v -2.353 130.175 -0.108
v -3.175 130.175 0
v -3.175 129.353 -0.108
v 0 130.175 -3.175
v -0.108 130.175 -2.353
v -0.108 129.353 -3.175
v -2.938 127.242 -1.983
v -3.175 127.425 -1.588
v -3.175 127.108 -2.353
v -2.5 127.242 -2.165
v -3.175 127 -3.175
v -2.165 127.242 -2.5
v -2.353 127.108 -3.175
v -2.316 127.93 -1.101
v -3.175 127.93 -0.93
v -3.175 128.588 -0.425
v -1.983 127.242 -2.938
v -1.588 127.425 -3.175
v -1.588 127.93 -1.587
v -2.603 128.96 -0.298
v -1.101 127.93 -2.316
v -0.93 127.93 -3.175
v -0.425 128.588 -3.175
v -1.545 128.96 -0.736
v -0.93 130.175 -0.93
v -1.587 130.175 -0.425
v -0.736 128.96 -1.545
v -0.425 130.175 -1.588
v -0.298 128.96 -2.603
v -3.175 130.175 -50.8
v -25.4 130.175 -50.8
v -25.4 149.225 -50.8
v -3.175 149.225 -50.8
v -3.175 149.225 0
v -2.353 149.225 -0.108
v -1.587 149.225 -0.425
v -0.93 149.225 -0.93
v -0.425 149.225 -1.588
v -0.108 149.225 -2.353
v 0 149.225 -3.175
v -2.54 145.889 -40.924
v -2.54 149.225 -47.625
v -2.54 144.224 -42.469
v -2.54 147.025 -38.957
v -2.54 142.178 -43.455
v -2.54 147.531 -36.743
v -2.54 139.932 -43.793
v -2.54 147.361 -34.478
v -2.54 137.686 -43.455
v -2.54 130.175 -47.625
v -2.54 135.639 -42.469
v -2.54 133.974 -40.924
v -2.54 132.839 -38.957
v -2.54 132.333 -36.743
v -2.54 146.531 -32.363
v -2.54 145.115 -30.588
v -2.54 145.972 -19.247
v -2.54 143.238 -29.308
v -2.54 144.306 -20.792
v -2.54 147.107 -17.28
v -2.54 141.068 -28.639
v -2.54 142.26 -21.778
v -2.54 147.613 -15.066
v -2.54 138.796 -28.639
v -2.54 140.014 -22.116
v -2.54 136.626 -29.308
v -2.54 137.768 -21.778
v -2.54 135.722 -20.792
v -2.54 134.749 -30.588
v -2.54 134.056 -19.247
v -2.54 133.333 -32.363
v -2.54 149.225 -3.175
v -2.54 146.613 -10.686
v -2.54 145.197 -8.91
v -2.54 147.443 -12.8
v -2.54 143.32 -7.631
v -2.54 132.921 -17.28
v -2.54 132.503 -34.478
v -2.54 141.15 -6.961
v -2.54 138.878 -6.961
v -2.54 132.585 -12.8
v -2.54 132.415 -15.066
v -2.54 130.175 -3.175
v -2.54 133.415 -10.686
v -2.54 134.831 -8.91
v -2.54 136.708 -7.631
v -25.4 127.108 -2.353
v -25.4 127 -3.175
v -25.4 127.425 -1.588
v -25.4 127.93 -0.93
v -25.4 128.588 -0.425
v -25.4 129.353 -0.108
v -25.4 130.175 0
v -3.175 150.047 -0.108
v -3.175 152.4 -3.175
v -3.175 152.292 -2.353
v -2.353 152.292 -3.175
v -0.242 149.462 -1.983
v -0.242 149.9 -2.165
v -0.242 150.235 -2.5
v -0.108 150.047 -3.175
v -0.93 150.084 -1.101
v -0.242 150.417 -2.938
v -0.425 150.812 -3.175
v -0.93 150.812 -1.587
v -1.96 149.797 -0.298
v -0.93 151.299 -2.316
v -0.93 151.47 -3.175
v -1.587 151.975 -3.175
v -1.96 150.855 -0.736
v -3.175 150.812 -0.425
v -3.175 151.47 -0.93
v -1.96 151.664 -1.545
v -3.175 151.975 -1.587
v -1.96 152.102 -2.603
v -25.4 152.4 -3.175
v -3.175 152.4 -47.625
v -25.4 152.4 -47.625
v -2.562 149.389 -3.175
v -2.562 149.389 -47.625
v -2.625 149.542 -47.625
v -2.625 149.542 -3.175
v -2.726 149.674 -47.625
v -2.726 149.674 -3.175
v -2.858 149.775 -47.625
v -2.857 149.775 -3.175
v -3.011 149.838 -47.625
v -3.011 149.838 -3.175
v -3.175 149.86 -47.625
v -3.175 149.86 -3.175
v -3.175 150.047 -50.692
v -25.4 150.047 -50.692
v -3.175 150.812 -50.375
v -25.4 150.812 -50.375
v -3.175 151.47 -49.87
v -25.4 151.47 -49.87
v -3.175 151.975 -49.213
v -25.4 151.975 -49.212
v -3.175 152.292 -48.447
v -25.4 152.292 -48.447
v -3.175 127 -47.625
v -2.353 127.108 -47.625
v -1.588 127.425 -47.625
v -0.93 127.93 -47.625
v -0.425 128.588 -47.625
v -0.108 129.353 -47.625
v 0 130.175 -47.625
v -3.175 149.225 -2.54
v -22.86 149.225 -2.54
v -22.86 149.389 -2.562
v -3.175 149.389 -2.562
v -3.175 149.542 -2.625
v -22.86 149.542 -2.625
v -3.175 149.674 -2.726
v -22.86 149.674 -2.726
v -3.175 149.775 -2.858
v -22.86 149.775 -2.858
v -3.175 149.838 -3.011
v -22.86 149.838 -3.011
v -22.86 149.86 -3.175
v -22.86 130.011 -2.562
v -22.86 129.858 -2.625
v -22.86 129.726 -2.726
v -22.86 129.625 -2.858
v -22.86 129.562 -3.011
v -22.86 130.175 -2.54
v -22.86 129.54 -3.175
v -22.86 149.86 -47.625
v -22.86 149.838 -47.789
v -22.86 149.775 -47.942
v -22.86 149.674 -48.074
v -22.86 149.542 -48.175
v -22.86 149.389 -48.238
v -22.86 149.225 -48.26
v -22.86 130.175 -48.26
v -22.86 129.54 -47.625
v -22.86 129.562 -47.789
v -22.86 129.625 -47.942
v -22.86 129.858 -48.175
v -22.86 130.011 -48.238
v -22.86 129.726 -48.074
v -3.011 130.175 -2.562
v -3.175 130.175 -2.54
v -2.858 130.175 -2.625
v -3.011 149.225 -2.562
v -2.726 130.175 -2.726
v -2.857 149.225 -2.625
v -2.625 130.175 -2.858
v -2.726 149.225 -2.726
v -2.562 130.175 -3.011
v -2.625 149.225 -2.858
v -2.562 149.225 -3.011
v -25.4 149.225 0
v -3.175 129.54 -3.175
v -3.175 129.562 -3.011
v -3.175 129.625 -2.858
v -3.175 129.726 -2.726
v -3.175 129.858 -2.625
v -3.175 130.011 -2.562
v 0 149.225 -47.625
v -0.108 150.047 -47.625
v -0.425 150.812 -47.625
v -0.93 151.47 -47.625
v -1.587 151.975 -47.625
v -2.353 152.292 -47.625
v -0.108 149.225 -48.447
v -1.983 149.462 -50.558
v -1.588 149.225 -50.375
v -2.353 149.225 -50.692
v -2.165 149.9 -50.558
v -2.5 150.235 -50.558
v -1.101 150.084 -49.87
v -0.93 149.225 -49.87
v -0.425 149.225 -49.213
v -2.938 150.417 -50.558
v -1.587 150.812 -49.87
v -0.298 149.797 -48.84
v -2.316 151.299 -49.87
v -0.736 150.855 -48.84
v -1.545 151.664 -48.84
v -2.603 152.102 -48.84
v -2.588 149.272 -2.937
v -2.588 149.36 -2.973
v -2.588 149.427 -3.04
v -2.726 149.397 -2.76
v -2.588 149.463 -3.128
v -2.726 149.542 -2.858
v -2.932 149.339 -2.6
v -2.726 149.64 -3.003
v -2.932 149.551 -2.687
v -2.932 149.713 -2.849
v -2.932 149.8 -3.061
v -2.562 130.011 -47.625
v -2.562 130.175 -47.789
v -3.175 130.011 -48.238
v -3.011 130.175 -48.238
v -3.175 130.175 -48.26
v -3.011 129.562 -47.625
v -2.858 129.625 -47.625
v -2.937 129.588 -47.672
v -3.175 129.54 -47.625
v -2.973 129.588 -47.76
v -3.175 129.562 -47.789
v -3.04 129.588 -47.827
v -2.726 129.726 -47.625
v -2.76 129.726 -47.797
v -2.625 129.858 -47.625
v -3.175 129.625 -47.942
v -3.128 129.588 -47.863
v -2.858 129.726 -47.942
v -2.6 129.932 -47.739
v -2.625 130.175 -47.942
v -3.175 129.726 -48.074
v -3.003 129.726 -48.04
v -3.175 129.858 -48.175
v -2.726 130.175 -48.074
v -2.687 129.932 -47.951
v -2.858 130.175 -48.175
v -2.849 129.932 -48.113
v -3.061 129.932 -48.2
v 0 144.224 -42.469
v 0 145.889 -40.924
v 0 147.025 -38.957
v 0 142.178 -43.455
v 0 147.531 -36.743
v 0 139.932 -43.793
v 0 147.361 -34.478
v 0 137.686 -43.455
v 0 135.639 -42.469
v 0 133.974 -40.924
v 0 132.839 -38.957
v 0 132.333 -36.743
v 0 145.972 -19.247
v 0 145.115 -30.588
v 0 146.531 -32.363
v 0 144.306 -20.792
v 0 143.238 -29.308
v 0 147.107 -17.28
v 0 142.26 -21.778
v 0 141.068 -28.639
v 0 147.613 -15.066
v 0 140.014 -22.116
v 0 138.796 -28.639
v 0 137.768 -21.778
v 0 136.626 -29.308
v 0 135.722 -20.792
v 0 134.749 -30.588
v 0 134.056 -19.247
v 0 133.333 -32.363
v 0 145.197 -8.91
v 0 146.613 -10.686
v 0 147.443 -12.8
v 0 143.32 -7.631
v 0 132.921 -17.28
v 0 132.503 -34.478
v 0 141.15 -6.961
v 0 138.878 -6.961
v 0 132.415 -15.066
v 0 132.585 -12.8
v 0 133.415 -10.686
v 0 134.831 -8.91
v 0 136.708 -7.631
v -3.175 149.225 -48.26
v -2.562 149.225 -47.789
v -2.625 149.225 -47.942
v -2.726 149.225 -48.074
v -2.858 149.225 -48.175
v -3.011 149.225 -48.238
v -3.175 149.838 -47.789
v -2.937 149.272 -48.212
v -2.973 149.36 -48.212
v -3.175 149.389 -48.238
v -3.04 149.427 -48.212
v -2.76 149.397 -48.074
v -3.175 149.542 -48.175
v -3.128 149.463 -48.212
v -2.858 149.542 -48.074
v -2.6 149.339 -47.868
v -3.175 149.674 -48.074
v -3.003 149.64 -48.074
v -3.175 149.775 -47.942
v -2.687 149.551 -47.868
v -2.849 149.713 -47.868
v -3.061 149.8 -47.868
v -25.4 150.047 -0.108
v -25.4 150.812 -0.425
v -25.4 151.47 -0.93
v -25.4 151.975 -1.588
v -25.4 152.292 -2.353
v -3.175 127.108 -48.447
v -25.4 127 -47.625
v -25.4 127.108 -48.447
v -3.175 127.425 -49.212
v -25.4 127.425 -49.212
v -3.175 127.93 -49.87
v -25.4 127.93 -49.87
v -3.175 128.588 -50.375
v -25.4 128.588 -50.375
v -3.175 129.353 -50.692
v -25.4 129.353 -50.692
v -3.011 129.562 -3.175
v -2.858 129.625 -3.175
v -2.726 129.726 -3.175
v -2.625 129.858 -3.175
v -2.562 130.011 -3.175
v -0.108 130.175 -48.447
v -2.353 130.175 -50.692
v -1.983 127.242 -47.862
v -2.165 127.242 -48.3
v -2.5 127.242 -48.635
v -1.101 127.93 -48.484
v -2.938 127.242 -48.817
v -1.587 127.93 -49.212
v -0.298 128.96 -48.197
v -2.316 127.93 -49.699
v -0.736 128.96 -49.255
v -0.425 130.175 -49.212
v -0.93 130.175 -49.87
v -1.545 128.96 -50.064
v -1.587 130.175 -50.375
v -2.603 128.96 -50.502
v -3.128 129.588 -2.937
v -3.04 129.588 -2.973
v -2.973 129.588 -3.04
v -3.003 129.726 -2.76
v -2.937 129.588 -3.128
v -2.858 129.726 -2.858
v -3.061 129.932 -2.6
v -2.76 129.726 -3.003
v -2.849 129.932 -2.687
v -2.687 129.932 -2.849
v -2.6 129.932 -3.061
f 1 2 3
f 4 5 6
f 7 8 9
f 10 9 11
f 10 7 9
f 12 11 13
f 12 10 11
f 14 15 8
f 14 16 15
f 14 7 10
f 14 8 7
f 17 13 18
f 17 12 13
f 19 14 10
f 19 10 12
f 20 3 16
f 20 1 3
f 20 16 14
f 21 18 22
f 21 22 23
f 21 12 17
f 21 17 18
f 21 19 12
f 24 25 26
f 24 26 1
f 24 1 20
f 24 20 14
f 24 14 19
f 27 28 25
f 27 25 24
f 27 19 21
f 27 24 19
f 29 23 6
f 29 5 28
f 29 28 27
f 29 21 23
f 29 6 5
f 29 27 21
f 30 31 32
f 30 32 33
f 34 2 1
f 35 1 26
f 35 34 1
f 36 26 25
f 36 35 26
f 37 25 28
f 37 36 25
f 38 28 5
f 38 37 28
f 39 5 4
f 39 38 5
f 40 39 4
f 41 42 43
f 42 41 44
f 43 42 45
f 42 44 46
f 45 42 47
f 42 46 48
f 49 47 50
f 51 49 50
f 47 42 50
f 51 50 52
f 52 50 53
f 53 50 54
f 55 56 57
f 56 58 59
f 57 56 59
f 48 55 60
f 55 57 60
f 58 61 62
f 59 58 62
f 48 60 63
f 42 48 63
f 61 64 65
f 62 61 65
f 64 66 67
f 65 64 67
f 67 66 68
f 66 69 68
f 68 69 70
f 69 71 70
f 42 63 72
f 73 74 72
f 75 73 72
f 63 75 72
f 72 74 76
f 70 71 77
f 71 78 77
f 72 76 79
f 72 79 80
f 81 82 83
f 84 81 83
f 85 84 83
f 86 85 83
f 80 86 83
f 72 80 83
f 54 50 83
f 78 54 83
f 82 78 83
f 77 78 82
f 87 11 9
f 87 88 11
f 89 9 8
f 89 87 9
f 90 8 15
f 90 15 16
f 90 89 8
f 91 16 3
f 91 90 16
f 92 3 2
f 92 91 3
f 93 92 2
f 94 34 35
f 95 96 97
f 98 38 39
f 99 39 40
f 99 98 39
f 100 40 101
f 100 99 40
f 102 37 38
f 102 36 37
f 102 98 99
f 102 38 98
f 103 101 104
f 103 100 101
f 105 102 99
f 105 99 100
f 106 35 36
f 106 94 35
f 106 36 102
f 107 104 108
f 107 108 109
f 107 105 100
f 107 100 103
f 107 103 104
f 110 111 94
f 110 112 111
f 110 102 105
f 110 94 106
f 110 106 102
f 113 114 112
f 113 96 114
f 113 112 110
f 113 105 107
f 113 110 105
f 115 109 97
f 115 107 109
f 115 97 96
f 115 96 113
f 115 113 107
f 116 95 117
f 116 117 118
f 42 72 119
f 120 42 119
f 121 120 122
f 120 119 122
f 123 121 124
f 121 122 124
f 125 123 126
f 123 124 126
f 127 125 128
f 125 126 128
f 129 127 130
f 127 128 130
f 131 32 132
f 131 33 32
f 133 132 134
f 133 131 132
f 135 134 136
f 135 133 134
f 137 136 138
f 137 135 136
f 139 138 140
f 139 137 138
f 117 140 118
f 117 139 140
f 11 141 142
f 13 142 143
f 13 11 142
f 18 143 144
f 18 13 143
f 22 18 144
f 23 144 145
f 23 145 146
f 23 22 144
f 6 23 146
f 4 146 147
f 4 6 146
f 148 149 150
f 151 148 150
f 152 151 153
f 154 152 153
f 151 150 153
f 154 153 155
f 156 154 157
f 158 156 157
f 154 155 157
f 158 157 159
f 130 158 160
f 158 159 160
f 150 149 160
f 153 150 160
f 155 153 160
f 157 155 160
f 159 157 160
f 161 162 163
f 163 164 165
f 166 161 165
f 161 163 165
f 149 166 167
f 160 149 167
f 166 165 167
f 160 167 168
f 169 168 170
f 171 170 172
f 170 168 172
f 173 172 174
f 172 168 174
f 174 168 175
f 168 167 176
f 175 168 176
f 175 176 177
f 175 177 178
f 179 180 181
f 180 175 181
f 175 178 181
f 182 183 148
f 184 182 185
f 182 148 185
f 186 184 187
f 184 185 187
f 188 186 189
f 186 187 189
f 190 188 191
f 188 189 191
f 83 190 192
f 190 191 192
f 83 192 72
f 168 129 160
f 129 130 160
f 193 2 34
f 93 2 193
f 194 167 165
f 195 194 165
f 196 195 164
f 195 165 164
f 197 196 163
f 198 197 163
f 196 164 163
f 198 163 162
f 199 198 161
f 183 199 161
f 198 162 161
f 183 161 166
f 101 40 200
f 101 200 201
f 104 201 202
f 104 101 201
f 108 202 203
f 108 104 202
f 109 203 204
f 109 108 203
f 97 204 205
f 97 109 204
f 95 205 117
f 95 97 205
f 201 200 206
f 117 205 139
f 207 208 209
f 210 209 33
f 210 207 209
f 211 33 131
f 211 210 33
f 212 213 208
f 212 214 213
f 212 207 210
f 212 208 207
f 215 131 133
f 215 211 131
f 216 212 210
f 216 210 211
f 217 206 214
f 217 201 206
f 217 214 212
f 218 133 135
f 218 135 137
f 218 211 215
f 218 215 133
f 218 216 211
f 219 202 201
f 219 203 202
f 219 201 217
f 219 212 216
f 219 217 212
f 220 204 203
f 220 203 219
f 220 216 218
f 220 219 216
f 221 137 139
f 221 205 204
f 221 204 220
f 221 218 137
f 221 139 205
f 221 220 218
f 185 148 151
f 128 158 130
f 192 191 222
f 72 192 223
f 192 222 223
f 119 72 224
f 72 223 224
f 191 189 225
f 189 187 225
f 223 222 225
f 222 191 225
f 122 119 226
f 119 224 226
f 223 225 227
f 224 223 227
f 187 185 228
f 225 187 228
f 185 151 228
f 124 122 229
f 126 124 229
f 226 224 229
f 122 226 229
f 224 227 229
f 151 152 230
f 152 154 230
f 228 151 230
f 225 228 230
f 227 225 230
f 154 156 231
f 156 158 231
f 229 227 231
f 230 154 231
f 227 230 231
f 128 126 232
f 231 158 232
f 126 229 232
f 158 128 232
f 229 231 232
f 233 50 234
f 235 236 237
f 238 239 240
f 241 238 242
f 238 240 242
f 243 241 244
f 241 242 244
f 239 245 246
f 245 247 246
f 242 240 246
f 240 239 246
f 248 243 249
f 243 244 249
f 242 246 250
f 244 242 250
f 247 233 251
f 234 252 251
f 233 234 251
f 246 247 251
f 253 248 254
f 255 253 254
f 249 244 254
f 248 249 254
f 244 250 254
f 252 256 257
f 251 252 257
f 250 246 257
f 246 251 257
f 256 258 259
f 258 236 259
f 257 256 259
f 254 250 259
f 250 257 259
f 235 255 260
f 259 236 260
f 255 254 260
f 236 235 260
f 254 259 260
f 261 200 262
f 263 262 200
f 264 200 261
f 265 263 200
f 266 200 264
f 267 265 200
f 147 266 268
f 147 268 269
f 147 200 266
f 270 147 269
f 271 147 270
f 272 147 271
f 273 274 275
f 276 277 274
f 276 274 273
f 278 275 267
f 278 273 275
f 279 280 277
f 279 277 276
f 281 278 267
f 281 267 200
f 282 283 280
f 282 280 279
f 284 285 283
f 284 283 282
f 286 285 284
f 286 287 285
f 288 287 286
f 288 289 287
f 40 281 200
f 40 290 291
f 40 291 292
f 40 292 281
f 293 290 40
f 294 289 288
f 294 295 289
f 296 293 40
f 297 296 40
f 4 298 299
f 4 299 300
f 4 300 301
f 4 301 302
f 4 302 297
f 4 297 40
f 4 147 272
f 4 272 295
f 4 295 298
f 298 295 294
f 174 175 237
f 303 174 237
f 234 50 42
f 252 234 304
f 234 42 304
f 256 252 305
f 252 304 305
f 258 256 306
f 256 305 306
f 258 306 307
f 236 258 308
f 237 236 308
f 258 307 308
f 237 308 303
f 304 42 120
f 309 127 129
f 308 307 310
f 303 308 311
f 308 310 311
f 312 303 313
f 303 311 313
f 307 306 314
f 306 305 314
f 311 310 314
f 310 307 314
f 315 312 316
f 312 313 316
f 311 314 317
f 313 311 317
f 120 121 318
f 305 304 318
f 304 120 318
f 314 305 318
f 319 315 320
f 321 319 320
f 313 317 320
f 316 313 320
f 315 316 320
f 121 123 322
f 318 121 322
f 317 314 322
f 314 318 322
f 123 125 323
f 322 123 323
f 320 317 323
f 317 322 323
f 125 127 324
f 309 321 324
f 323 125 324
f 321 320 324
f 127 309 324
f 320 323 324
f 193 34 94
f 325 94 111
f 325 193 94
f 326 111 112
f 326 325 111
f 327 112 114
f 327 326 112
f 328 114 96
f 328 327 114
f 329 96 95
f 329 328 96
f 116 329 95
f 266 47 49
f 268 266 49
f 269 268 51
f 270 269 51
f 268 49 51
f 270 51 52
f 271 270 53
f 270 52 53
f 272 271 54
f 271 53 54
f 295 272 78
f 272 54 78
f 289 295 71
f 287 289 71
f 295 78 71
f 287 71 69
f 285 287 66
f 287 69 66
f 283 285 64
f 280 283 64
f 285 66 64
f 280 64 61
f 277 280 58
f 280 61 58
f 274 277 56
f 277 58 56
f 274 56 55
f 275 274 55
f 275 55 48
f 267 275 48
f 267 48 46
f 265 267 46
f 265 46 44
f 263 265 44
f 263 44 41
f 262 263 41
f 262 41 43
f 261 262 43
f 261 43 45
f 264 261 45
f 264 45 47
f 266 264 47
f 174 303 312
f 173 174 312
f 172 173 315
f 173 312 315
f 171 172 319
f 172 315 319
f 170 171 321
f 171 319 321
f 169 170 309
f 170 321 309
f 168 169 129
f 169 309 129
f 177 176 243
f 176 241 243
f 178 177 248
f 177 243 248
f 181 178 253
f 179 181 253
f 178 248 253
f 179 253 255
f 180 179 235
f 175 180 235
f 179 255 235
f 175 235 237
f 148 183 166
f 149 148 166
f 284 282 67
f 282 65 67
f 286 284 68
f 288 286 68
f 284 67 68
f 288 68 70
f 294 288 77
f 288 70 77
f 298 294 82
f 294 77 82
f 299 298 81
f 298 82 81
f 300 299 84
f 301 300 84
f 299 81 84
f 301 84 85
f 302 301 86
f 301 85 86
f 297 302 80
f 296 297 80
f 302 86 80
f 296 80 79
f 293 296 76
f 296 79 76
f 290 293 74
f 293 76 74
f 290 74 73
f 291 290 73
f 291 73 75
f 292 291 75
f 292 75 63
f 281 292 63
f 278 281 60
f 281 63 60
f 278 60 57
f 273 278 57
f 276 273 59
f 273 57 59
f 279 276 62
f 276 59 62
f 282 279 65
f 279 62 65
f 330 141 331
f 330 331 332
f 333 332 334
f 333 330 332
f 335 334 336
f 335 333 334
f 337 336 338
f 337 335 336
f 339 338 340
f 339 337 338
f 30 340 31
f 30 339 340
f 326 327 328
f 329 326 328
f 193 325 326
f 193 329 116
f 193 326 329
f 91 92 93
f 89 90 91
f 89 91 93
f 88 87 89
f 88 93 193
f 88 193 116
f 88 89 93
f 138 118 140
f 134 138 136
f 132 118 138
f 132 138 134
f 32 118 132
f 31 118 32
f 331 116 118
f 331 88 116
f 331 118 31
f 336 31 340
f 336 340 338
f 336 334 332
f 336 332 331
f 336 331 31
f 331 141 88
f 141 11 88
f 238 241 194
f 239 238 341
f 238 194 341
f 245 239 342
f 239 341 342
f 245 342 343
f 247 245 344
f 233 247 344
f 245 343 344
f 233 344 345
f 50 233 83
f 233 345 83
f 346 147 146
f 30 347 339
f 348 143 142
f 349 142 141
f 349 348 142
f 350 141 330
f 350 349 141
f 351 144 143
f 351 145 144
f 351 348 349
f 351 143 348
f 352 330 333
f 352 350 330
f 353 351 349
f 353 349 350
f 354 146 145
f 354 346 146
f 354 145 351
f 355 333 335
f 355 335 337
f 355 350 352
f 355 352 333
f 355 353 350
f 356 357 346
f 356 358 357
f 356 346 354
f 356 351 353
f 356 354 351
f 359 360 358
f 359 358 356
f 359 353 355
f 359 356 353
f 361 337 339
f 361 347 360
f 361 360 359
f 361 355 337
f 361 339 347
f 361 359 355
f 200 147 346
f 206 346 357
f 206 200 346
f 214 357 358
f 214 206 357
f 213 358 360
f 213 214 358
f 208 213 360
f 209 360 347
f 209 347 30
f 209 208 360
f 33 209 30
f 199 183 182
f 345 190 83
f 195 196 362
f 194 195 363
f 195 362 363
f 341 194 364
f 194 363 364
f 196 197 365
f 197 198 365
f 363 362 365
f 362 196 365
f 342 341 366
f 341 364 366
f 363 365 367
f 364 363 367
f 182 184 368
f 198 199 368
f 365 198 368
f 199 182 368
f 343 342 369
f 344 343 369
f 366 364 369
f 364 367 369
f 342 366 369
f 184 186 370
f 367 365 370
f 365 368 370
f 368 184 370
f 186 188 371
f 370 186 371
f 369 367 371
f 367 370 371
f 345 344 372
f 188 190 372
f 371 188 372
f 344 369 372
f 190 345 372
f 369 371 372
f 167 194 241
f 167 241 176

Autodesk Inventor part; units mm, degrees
ref_plane "YZ Plane" through (0, 0, 0) normal (1, 0, 0) x (0, 1, 0)
ref_plane "XY Plane" through (0, 0, 0) normal (0, 0, 1) x (1, 0, 0)
ref_plane "Work Plane1" through (0, 127, 0) normal (0, 1, 0) x (-1, 0, 0)
sketch "Sketch1" plane through (0, 127, 0) normal (0, 1, 0) x (-1, 0, 0)
  line L0 (0, 0) -> (25.4, 0)
  line L1 (25.4, 0) -> (25.4, -50.8)
  line L2 (25.4, -50.8) -> (0, -50.8)
  line L3 (0, -50.8) -> (0, 0)
  dimension "d1" = 25.4
  dimension "d2" = 50.8
extrude "Extrusion1" add sketch "Sketch1" along normal blind 25.4
fillet "Fillet1" radius 3.175 8 edges at (-12.7, 152.4, 0) (0, 139.7, 0) (0, 152.4, -25.4) (0, 139.7, -50.8) (-12.7, 152.4, -50.8) (0, 127, -25.4) (-12.7, 127, 0) (-12.7, 127, -50.8)
shell "Shell1" thickness 2.54 removed faces 0
sketch "Sketch2" plane through (0, 130.175, -47.625) normal (1, 0, 0) x (0, 0, -1)
  point P0 (-47.625, -130.175)
  point P1 (-33.1289, 9.839)
  point P2 (-11.4516, 9.7569)
hole "Hole1" at (0, 139.9319, -36.1734) at (0, 140.014, -14.4961) direction (-1, 0, 0) diameter 15.24 depth 2.54
properties part number "Ultrasonic Case"
